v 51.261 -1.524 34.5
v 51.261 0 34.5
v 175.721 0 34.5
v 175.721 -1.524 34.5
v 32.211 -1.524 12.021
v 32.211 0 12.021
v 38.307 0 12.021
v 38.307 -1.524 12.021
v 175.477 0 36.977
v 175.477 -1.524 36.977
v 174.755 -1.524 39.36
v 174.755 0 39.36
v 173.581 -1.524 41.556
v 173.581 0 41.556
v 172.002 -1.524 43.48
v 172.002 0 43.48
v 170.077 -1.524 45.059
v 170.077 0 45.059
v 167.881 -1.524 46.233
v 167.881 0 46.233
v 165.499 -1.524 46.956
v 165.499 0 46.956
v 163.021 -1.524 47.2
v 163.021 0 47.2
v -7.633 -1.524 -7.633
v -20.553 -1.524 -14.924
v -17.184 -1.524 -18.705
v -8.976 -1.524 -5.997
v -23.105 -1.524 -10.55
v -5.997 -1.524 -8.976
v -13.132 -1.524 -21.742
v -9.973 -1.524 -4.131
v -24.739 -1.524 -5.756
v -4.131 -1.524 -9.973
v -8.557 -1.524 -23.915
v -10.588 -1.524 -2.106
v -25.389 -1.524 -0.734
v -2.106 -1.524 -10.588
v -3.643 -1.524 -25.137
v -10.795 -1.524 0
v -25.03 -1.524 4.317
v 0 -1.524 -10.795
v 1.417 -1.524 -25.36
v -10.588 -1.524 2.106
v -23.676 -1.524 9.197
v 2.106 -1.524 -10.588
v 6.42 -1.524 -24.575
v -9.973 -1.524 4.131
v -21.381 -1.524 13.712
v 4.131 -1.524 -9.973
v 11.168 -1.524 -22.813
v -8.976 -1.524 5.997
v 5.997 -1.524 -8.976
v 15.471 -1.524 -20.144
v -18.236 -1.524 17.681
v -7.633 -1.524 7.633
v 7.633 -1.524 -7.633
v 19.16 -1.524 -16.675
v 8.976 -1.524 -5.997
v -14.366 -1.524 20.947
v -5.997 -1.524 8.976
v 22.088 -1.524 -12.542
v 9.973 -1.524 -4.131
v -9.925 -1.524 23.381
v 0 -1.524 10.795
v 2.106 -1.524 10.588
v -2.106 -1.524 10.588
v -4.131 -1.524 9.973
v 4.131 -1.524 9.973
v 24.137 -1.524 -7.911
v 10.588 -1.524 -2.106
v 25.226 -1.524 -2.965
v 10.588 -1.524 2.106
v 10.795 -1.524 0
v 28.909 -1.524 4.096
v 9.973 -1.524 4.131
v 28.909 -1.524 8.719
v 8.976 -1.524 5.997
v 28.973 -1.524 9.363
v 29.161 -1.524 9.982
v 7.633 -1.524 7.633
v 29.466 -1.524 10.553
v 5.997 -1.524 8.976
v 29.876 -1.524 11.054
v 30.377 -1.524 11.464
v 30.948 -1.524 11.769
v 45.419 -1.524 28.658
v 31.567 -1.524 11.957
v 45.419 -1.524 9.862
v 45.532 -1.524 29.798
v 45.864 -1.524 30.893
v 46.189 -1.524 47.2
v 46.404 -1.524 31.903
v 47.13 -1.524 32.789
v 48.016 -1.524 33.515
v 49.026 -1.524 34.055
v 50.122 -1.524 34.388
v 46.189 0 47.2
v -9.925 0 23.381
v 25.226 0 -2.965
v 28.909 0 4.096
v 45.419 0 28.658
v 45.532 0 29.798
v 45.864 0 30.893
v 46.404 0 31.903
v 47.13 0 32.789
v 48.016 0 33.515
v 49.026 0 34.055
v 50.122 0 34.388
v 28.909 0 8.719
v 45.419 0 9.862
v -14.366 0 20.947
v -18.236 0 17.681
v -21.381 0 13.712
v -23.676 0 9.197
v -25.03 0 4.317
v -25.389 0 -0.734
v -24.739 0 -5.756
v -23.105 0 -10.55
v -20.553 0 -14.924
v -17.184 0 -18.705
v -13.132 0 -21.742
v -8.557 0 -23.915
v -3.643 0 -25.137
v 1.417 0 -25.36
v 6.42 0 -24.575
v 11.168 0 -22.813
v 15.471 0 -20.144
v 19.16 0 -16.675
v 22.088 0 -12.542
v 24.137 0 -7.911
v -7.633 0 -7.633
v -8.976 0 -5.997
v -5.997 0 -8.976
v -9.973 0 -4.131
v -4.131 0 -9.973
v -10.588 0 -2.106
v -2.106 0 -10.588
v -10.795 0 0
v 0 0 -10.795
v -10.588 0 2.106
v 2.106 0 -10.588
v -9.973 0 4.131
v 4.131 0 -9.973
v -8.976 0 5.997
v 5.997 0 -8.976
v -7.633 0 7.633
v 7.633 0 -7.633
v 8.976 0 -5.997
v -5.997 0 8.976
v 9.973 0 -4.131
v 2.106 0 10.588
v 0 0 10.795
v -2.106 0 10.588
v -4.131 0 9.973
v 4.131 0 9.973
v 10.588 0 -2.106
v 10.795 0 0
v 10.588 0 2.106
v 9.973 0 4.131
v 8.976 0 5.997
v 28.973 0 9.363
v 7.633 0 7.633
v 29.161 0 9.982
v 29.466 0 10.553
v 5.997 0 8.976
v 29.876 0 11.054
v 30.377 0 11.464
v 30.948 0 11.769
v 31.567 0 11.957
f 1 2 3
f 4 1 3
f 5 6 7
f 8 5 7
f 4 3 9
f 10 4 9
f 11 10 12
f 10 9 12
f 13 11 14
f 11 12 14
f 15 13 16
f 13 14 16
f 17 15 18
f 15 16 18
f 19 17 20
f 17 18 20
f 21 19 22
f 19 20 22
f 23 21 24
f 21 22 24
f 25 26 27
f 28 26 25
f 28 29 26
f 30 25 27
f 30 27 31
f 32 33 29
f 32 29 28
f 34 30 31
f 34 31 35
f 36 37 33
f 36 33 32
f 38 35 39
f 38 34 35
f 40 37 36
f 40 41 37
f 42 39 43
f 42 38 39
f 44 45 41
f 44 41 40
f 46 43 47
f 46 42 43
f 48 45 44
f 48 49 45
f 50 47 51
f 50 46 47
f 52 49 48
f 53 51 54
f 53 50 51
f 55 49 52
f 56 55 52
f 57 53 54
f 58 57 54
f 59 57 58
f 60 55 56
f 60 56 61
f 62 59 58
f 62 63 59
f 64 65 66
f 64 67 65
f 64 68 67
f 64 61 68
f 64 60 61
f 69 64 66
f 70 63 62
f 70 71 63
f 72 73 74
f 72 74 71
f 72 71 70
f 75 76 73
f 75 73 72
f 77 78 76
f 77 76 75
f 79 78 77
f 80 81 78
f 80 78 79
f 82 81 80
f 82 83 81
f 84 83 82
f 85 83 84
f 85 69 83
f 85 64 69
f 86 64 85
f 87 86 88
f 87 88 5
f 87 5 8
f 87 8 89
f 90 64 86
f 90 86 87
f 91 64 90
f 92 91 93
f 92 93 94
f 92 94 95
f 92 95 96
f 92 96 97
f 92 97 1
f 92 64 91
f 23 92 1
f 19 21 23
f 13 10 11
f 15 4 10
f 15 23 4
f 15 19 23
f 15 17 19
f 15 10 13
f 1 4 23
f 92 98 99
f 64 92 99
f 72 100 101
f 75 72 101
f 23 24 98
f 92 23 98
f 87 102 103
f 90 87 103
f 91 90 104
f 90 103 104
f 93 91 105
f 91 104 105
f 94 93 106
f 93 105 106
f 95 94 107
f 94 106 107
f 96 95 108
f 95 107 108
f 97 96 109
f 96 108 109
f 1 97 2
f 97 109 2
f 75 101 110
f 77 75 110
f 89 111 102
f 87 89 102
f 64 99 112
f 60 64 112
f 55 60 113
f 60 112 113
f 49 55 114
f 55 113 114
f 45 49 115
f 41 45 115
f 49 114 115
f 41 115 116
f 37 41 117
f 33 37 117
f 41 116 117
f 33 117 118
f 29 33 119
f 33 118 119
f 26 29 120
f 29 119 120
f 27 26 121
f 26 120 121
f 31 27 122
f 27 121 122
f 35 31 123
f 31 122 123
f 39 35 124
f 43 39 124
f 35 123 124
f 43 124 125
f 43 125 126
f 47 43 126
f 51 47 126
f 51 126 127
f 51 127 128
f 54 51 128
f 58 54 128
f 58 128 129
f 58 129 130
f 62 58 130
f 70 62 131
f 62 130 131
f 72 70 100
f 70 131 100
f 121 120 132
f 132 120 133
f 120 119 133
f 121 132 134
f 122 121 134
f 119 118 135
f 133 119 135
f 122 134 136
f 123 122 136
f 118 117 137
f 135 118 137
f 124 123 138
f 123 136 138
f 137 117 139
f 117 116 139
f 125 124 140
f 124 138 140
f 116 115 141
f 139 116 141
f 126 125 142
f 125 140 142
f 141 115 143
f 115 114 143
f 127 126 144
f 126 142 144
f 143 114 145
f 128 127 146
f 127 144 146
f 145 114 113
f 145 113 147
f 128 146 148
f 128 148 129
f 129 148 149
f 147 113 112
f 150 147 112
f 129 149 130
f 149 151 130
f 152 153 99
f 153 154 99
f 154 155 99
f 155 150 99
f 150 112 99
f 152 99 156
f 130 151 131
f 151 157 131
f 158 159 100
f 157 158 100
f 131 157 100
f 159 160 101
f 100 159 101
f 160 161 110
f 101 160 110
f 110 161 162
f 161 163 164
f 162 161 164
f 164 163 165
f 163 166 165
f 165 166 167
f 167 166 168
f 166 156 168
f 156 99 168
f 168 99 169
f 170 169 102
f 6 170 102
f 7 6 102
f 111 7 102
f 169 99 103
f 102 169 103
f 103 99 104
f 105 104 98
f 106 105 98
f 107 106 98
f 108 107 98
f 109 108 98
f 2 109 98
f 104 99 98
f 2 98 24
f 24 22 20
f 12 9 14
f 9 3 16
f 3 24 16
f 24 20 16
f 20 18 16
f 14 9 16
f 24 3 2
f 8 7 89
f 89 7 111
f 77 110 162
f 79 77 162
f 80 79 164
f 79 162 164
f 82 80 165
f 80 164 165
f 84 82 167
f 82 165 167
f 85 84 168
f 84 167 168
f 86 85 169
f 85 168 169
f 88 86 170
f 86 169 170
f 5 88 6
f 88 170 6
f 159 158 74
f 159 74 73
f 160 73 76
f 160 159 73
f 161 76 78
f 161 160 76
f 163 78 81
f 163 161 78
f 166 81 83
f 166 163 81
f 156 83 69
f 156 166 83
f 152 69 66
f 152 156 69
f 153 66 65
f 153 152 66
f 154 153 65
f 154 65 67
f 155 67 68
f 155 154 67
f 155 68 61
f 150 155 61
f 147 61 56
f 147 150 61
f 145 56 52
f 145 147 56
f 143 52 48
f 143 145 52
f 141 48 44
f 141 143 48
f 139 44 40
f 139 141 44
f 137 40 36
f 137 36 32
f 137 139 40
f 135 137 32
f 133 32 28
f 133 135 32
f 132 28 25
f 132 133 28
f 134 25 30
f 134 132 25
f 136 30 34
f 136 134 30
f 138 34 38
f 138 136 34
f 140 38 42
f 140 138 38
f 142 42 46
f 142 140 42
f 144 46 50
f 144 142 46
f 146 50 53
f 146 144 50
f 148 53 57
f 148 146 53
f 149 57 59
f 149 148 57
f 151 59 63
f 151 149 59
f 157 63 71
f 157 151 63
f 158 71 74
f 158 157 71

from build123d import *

# Parameters (mm, degrees)
F0_R     = 10.795
F1_DEPTH = 1.524


with BuildPart() as f1:
    # F0 (on Front) → F1 (new body)
    with BuildSketch(Plane.XZ):
        with BuildLine():
            ThreePointArc((25.226326, -2.965207), (25.356544, -1.485144), (25.4, 0))
            ThreePointArc((25.4, 0), (14.019199, 21.1807), (-9.924571, 23.380823))
            ThreePointArc((-9.924571, 23.380823), (-15.233656, -20.324757), (25.226326, -2.965207))
        make_face()
        Circle(F0_R, mode=Mode.SUBTRACT)
        with BuildLine():
            ThreePointArc((-9.924571, 23.380823), (14.019199, 21.1807), (25.4, 0))
            ThreePointArc((25.4, 0), (25.356544, -1.485144), (25.226326, -2.965207))
            Line((25.226326, -2.965207), (28.909326, 4.095993))
            Line((28.909326, 4.095993), (28.909326, 8.718793))
            ThreePointArc((28.909326, 8.718793), (29.87646, 11.053659), (32.211326, 12.020793))
            Line((32.211326, 12.020793), (38.307326, 12.020793))
            Line((38.307326, 12.020793), (45.419326, 9.861793))
            Line((45.419326, 9.861793), (45.419326, 28.657793))
            ThreePointArc((45.419326, 28.657793), (47.130409, 32.788711), (51.261326, 34.499793))
            Line((51.261326, 34.499793), (175.721326, 34.499793))
            ThreePointArc((175.721326, 34.499793), (172.001583, 43.480049), (163.021326, 47.199793))
            Line((163.021326, 47.199793), (46.189405, 47.199793))
            Line((46.189405, 47.199793), (-9.924571, 23.380823))
        make_face()
    extrude(amount=F1_DEPTH)


solid = f1.part
